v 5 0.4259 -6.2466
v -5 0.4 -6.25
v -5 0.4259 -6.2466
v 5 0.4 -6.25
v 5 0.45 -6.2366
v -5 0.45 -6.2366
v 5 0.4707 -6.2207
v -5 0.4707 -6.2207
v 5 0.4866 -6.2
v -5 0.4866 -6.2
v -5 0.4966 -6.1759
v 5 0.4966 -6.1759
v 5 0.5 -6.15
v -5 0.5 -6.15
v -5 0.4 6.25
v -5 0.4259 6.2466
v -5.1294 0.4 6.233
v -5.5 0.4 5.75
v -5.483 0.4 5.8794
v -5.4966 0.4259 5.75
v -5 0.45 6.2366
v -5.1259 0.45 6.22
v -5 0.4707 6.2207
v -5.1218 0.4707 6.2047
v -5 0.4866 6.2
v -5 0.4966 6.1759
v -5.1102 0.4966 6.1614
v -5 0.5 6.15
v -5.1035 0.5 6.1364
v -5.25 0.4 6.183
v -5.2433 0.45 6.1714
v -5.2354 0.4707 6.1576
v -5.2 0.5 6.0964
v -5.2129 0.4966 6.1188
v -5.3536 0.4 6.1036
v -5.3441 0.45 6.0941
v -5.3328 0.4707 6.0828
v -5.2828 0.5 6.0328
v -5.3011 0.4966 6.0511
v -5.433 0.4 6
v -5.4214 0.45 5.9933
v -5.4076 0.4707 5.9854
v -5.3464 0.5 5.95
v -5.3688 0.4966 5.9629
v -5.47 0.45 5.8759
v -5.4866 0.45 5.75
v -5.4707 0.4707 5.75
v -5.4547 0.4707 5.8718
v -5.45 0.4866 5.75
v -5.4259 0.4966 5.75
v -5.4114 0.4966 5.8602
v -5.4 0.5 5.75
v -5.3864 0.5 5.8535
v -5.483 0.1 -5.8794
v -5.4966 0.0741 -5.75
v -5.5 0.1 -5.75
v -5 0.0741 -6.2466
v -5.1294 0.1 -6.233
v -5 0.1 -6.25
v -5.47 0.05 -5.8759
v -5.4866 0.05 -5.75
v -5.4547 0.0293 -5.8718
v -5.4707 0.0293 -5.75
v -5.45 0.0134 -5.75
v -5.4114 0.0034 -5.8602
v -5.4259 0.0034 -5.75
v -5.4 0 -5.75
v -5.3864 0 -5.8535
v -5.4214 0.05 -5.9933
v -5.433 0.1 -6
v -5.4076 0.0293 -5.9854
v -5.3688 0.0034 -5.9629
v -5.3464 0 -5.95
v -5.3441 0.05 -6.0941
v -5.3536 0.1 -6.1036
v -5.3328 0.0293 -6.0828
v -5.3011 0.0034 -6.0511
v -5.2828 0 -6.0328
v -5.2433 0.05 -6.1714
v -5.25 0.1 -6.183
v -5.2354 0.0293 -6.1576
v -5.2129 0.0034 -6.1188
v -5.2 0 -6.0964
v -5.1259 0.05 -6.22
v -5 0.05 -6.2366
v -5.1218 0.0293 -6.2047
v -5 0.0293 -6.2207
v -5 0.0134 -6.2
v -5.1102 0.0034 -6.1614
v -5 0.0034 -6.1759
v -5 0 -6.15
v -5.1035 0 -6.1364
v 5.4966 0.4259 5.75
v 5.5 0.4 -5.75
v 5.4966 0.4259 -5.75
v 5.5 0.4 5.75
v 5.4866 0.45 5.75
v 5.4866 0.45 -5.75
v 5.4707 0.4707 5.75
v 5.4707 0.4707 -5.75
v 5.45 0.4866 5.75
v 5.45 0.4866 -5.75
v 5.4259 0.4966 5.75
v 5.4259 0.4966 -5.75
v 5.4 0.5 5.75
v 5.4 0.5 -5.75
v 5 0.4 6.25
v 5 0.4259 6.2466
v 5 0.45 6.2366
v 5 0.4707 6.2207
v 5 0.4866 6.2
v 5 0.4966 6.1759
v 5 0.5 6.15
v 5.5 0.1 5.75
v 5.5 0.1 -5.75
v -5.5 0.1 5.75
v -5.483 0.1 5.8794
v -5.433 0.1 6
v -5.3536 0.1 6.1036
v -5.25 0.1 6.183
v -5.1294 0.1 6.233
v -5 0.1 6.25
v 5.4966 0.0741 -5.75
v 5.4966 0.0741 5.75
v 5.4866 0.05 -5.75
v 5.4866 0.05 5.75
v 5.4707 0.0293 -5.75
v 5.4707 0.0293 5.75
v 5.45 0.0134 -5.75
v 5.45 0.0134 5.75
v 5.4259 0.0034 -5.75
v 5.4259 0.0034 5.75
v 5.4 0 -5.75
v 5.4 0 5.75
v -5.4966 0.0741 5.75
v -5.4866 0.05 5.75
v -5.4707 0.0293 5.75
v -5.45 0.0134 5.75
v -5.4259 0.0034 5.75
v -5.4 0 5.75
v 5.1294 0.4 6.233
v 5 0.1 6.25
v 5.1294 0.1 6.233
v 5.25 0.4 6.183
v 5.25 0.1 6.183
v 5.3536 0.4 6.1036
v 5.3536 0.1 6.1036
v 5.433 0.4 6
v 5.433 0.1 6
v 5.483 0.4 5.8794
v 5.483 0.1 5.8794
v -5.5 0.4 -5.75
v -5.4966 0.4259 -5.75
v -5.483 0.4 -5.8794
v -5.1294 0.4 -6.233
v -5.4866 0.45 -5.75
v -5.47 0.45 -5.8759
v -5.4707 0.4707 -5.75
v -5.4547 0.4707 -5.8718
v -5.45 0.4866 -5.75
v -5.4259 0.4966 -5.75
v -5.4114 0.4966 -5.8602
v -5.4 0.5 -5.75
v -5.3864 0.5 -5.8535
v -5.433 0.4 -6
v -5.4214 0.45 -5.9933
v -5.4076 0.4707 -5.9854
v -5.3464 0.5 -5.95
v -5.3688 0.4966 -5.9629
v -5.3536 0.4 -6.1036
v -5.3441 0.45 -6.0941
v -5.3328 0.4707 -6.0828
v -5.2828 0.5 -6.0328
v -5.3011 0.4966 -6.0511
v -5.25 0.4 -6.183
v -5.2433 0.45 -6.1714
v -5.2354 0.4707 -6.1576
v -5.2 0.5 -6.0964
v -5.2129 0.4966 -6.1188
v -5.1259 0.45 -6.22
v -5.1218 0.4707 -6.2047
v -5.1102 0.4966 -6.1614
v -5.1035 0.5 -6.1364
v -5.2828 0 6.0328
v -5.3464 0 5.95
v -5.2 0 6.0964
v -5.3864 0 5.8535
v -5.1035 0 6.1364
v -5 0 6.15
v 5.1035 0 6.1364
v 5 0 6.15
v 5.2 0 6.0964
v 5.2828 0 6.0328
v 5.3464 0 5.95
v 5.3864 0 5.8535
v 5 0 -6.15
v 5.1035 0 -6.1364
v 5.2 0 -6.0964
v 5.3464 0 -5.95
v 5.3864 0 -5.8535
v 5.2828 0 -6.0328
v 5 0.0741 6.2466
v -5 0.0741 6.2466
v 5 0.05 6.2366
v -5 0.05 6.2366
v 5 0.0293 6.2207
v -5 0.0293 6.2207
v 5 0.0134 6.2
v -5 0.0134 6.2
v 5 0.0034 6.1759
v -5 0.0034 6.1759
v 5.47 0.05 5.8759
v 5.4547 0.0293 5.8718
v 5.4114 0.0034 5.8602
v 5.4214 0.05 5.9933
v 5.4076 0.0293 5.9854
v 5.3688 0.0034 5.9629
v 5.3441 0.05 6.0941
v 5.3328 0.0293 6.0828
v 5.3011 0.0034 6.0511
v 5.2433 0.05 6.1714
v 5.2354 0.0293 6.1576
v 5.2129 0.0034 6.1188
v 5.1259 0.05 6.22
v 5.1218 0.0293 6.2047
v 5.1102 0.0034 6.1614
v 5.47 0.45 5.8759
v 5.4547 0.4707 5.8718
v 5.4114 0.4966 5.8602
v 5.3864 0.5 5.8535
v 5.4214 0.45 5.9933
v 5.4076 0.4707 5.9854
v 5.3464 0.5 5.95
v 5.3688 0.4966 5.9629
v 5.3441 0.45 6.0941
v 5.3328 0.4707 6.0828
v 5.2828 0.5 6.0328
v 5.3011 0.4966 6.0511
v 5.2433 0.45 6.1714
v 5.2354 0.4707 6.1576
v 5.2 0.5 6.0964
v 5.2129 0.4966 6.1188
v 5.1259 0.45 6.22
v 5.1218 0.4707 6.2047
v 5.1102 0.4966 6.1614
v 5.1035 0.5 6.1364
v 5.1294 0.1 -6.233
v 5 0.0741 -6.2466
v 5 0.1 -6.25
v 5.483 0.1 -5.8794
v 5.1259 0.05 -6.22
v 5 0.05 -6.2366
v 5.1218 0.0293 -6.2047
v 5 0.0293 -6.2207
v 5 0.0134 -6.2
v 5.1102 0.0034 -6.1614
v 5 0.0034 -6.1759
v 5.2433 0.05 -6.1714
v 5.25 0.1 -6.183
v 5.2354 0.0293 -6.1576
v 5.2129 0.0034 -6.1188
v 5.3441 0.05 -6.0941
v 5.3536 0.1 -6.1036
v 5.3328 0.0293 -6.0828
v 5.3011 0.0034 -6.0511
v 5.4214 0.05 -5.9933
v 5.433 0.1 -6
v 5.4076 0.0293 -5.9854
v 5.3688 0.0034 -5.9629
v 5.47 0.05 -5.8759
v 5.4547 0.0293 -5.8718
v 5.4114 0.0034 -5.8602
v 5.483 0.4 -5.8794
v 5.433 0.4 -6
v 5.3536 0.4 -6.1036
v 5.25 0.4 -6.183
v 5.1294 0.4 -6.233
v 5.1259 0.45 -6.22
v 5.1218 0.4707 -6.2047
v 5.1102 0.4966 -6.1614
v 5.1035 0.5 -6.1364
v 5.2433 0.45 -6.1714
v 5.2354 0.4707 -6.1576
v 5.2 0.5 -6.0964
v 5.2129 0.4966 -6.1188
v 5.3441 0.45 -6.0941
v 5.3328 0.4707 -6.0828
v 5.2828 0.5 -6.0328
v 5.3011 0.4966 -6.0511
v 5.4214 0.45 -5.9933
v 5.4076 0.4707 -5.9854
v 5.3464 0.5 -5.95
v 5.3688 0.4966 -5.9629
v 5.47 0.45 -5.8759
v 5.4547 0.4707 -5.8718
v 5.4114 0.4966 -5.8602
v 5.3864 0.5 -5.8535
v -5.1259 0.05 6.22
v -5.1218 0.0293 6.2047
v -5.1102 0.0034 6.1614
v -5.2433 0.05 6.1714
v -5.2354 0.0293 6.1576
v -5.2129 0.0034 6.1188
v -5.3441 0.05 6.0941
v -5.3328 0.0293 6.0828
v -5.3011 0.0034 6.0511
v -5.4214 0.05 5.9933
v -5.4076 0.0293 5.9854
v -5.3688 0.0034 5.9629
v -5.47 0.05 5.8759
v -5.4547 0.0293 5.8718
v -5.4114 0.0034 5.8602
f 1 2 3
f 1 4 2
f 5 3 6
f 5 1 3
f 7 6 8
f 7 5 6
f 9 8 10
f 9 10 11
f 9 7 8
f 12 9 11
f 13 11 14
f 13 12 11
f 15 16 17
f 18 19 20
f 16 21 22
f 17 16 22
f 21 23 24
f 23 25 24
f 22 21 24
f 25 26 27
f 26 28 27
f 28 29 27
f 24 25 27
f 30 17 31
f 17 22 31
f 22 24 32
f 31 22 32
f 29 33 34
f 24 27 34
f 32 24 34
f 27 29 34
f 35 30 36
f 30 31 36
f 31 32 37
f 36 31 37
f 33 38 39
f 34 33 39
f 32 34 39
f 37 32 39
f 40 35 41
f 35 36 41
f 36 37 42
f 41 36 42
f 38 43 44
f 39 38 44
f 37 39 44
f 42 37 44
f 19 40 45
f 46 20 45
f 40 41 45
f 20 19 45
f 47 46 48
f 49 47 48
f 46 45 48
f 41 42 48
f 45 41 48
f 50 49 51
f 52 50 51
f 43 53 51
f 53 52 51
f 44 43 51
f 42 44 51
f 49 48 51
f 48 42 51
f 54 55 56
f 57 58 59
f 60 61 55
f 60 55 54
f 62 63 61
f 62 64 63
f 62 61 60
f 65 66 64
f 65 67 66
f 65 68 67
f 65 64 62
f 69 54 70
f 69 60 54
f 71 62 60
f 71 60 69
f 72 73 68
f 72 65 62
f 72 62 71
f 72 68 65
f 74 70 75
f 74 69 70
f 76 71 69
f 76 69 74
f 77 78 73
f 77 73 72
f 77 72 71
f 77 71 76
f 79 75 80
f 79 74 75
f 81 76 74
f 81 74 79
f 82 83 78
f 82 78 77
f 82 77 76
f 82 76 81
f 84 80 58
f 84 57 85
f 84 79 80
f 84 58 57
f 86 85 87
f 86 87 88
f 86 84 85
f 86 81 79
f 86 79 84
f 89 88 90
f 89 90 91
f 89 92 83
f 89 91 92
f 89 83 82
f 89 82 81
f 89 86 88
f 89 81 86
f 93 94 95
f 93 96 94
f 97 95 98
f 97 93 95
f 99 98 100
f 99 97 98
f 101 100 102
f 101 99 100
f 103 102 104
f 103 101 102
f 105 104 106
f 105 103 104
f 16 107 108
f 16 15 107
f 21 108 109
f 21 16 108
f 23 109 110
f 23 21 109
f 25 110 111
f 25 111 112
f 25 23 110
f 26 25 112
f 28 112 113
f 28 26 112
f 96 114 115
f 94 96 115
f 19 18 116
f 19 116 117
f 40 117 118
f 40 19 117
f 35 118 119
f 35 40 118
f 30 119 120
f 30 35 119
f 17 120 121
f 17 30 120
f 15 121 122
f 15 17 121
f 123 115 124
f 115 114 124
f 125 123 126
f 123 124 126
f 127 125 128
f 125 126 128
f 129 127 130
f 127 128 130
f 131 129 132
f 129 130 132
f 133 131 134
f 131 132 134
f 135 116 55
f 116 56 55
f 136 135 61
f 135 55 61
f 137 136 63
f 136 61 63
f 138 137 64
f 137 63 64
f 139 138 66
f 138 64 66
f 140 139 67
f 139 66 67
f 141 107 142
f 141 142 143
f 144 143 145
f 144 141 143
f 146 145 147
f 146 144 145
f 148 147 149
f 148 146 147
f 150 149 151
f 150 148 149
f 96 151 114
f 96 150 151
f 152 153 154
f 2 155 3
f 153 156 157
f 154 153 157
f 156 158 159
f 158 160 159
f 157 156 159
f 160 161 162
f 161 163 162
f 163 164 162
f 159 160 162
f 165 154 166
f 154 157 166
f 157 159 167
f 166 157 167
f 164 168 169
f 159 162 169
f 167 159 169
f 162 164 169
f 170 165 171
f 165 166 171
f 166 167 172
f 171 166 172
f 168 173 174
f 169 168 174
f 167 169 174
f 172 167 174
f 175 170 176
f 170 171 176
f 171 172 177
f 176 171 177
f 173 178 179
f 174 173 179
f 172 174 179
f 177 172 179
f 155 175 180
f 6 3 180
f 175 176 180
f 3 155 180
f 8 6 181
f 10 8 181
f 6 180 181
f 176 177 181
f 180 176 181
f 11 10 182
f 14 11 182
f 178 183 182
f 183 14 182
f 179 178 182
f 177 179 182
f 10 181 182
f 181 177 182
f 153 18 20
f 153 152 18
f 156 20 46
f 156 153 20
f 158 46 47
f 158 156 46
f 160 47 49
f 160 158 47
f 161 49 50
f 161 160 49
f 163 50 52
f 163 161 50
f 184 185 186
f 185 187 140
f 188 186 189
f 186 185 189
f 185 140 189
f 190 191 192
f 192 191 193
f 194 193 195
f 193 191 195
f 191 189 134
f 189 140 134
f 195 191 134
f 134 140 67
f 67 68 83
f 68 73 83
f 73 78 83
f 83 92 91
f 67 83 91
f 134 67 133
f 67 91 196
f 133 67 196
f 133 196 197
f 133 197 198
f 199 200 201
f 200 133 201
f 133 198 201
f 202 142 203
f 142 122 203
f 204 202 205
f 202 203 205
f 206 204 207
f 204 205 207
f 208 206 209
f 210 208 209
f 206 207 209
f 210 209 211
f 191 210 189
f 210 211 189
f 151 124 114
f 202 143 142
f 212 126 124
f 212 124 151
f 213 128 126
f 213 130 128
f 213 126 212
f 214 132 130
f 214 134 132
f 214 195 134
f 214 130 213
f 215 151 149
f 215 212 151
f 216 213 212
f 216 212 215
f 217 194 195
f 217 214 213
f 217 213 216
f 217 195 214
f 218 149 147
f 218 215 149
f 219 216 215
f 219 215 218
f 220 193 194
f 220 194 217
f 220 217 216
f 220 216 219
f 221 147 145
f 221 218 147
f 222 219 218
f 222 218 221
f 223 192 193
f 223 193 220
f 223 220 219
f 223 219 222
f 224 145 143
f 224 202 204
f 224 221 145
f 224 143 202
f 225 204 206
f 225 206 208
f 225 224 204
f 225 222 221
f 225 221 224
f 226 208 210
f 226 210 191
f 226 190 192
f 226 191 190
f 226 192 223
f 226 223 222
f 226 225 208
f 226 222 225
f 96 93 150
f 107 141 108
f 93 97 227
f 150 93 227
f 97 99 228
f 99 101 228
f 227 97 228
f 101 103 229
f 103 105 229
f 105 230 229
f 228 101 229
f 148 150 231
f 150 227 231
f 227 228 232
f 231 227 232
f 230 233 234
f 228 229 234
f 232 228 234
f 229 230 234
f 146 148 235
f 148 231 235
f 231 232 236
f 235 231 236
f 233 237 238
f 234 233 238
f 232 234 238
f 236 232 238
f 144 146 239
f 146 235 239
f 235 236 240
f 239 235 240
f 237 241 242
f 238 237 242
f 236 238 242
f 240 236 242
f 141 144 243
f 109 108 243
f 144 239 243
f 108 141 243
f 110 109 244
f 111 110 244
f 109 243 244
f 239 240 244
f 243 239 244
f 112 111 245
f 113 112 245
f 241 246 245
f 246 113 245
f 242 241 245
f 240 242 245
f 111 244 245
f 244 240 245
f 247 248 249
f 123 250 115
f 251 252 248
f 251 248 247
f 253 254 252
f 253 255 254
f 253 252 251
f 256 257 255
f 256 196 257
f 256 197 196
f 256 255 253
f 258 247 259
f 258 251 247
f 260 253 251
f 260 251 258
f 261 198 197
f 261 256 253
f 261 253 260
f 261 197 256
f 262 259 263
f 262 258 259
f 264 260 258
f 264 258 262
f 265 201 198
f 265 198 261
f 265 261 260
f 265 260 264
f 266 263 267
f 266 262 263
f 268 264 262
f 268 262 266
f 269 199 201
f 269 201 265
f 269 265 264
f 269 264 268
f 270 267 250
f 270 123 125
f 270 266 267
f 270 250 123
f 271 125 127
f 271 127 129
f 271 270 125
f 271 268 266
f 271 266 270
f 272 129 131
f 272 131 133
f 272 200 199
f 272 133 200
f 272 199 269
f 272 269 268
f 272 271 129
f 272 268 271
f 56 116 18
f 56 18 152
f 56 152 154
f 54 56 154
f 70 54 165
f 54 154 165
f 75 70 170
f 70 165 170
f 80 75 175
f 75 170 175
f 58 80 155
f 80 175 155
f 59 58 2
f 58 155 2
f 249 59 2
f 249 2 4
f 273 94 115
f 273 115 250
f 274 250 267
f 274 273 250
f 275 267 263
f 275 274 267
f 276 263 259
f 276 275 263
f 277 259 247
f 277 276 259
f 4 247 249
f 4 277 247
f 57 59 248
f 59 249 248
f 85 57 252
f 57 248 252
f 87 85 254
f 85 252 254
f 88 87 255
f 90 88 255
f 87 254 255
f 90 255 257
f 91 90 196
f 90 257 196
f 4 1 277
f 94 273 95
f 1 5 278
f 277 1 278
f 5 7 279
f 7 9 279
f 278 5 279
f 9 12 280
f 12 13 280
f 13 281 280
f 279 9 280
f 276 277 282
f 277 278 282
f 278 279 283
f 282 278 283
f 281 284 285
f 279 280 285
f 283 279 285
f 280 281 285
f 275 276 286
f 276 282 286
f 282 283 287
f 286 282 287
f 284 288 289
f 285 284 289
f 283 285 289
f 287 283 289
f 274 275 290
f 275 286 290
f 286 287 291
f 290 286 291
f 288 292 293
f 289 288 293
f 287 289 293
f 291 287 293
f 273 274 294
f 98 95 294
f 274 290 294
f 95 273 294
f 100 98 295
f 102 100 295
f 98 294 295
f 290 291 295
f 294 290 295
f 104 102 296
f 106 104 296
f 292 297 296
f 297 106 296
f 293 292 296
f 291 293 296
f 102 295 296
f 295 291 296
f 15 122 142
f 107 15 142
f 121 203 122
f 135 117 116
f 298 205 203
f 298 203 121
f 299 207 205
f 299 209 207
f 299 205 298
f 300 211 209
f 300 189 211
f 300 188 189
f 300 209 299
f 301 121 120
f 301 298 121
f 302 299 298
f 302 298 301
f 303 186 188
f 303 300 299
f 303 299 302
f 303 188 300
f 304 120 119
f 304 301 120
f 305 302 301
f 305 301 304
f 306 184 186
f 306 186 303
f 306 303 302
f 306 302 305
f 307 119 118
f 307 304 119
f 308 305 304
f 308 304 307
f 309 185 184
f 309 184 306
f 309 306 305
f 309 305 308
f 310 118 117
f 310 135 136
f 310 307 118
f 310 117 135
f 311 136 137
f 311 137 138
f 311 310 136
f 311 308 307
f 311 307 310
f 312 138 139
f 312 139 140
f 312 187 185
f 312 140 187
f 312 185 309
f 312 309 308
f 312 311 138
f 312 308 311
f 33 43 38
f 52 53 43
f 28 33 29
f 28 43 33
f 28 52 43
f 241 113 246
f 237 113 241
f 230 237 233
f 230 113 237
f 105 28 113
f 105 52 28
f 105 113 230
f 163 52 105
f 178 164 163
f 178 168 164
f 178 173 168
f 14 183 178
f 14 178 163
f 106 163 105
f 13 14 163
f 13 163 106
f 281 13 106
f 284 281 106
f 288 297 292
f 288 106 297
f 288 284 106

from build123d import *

# Parameters (mm, degrees)
SKETCH1_W           = 11
SKETCH1_H           = 12.5
BOSS_EXTRUDE1_DEPTH = 0.5
FILLET1_R           = 0.5
FILLET2_R           = 0.1


with BuildPart() as part:
    # Sketch1 → Boss-Extrude1 (new body)
    with BuildSketch(Plane(origin=(0, 0, 0), x_dir=(1, 0, 0), z_dir=(0, 1, 0))):
        Rectangle(SKETCH1_W, SKETCH1_H)
    extrude(amount=BOSS_EXTRUDE1_DEPTH)

    # Fillet1
    fillet1_edges = [part.edges().sort_by_distance(p)[0] for p in [
        (-5.5, 0.25, -6.25),
        (5.5, 0.25, -6.25),
        (5.5, 0.25, 6.25),
        (-5.5, 0.25, 6.25),
    ]]
    fillet(fillet1_edges, radius=FILLET1_R)

    # Fillet2
    fillet2_edges = [part.edges().sort_by_distance(p)[0] for p in [
        (-5.5, 0, 0),
        (-5.5, 0.5, 0),
        (0, 0, -6.25),
        (5.5, 0, 0),
        (0, 0, 6.25),
        (5.353553391, 0, 6.103553391),
        (-5.353553391, 0, 6.103553391),
        (5.353553391, 0, -6.103553391),
        (-5.353553391, 0, -6.103553391),
        (0, 0.5, -6.25),
        (0, 0.5, 6.25),
        (5.5, 0.5, 0),
        (5.353553391, 0.5, 6.103553391),
        (-5.353553391, 0.5, 6.103553391),
        (5.353553391, 0.5, -6.103553391),
        (-5.353553391, 0.5, -6.103553391),
    ]]
    fillet(fillet2_edges, radius=FILLET2_R)


solid = part.part
